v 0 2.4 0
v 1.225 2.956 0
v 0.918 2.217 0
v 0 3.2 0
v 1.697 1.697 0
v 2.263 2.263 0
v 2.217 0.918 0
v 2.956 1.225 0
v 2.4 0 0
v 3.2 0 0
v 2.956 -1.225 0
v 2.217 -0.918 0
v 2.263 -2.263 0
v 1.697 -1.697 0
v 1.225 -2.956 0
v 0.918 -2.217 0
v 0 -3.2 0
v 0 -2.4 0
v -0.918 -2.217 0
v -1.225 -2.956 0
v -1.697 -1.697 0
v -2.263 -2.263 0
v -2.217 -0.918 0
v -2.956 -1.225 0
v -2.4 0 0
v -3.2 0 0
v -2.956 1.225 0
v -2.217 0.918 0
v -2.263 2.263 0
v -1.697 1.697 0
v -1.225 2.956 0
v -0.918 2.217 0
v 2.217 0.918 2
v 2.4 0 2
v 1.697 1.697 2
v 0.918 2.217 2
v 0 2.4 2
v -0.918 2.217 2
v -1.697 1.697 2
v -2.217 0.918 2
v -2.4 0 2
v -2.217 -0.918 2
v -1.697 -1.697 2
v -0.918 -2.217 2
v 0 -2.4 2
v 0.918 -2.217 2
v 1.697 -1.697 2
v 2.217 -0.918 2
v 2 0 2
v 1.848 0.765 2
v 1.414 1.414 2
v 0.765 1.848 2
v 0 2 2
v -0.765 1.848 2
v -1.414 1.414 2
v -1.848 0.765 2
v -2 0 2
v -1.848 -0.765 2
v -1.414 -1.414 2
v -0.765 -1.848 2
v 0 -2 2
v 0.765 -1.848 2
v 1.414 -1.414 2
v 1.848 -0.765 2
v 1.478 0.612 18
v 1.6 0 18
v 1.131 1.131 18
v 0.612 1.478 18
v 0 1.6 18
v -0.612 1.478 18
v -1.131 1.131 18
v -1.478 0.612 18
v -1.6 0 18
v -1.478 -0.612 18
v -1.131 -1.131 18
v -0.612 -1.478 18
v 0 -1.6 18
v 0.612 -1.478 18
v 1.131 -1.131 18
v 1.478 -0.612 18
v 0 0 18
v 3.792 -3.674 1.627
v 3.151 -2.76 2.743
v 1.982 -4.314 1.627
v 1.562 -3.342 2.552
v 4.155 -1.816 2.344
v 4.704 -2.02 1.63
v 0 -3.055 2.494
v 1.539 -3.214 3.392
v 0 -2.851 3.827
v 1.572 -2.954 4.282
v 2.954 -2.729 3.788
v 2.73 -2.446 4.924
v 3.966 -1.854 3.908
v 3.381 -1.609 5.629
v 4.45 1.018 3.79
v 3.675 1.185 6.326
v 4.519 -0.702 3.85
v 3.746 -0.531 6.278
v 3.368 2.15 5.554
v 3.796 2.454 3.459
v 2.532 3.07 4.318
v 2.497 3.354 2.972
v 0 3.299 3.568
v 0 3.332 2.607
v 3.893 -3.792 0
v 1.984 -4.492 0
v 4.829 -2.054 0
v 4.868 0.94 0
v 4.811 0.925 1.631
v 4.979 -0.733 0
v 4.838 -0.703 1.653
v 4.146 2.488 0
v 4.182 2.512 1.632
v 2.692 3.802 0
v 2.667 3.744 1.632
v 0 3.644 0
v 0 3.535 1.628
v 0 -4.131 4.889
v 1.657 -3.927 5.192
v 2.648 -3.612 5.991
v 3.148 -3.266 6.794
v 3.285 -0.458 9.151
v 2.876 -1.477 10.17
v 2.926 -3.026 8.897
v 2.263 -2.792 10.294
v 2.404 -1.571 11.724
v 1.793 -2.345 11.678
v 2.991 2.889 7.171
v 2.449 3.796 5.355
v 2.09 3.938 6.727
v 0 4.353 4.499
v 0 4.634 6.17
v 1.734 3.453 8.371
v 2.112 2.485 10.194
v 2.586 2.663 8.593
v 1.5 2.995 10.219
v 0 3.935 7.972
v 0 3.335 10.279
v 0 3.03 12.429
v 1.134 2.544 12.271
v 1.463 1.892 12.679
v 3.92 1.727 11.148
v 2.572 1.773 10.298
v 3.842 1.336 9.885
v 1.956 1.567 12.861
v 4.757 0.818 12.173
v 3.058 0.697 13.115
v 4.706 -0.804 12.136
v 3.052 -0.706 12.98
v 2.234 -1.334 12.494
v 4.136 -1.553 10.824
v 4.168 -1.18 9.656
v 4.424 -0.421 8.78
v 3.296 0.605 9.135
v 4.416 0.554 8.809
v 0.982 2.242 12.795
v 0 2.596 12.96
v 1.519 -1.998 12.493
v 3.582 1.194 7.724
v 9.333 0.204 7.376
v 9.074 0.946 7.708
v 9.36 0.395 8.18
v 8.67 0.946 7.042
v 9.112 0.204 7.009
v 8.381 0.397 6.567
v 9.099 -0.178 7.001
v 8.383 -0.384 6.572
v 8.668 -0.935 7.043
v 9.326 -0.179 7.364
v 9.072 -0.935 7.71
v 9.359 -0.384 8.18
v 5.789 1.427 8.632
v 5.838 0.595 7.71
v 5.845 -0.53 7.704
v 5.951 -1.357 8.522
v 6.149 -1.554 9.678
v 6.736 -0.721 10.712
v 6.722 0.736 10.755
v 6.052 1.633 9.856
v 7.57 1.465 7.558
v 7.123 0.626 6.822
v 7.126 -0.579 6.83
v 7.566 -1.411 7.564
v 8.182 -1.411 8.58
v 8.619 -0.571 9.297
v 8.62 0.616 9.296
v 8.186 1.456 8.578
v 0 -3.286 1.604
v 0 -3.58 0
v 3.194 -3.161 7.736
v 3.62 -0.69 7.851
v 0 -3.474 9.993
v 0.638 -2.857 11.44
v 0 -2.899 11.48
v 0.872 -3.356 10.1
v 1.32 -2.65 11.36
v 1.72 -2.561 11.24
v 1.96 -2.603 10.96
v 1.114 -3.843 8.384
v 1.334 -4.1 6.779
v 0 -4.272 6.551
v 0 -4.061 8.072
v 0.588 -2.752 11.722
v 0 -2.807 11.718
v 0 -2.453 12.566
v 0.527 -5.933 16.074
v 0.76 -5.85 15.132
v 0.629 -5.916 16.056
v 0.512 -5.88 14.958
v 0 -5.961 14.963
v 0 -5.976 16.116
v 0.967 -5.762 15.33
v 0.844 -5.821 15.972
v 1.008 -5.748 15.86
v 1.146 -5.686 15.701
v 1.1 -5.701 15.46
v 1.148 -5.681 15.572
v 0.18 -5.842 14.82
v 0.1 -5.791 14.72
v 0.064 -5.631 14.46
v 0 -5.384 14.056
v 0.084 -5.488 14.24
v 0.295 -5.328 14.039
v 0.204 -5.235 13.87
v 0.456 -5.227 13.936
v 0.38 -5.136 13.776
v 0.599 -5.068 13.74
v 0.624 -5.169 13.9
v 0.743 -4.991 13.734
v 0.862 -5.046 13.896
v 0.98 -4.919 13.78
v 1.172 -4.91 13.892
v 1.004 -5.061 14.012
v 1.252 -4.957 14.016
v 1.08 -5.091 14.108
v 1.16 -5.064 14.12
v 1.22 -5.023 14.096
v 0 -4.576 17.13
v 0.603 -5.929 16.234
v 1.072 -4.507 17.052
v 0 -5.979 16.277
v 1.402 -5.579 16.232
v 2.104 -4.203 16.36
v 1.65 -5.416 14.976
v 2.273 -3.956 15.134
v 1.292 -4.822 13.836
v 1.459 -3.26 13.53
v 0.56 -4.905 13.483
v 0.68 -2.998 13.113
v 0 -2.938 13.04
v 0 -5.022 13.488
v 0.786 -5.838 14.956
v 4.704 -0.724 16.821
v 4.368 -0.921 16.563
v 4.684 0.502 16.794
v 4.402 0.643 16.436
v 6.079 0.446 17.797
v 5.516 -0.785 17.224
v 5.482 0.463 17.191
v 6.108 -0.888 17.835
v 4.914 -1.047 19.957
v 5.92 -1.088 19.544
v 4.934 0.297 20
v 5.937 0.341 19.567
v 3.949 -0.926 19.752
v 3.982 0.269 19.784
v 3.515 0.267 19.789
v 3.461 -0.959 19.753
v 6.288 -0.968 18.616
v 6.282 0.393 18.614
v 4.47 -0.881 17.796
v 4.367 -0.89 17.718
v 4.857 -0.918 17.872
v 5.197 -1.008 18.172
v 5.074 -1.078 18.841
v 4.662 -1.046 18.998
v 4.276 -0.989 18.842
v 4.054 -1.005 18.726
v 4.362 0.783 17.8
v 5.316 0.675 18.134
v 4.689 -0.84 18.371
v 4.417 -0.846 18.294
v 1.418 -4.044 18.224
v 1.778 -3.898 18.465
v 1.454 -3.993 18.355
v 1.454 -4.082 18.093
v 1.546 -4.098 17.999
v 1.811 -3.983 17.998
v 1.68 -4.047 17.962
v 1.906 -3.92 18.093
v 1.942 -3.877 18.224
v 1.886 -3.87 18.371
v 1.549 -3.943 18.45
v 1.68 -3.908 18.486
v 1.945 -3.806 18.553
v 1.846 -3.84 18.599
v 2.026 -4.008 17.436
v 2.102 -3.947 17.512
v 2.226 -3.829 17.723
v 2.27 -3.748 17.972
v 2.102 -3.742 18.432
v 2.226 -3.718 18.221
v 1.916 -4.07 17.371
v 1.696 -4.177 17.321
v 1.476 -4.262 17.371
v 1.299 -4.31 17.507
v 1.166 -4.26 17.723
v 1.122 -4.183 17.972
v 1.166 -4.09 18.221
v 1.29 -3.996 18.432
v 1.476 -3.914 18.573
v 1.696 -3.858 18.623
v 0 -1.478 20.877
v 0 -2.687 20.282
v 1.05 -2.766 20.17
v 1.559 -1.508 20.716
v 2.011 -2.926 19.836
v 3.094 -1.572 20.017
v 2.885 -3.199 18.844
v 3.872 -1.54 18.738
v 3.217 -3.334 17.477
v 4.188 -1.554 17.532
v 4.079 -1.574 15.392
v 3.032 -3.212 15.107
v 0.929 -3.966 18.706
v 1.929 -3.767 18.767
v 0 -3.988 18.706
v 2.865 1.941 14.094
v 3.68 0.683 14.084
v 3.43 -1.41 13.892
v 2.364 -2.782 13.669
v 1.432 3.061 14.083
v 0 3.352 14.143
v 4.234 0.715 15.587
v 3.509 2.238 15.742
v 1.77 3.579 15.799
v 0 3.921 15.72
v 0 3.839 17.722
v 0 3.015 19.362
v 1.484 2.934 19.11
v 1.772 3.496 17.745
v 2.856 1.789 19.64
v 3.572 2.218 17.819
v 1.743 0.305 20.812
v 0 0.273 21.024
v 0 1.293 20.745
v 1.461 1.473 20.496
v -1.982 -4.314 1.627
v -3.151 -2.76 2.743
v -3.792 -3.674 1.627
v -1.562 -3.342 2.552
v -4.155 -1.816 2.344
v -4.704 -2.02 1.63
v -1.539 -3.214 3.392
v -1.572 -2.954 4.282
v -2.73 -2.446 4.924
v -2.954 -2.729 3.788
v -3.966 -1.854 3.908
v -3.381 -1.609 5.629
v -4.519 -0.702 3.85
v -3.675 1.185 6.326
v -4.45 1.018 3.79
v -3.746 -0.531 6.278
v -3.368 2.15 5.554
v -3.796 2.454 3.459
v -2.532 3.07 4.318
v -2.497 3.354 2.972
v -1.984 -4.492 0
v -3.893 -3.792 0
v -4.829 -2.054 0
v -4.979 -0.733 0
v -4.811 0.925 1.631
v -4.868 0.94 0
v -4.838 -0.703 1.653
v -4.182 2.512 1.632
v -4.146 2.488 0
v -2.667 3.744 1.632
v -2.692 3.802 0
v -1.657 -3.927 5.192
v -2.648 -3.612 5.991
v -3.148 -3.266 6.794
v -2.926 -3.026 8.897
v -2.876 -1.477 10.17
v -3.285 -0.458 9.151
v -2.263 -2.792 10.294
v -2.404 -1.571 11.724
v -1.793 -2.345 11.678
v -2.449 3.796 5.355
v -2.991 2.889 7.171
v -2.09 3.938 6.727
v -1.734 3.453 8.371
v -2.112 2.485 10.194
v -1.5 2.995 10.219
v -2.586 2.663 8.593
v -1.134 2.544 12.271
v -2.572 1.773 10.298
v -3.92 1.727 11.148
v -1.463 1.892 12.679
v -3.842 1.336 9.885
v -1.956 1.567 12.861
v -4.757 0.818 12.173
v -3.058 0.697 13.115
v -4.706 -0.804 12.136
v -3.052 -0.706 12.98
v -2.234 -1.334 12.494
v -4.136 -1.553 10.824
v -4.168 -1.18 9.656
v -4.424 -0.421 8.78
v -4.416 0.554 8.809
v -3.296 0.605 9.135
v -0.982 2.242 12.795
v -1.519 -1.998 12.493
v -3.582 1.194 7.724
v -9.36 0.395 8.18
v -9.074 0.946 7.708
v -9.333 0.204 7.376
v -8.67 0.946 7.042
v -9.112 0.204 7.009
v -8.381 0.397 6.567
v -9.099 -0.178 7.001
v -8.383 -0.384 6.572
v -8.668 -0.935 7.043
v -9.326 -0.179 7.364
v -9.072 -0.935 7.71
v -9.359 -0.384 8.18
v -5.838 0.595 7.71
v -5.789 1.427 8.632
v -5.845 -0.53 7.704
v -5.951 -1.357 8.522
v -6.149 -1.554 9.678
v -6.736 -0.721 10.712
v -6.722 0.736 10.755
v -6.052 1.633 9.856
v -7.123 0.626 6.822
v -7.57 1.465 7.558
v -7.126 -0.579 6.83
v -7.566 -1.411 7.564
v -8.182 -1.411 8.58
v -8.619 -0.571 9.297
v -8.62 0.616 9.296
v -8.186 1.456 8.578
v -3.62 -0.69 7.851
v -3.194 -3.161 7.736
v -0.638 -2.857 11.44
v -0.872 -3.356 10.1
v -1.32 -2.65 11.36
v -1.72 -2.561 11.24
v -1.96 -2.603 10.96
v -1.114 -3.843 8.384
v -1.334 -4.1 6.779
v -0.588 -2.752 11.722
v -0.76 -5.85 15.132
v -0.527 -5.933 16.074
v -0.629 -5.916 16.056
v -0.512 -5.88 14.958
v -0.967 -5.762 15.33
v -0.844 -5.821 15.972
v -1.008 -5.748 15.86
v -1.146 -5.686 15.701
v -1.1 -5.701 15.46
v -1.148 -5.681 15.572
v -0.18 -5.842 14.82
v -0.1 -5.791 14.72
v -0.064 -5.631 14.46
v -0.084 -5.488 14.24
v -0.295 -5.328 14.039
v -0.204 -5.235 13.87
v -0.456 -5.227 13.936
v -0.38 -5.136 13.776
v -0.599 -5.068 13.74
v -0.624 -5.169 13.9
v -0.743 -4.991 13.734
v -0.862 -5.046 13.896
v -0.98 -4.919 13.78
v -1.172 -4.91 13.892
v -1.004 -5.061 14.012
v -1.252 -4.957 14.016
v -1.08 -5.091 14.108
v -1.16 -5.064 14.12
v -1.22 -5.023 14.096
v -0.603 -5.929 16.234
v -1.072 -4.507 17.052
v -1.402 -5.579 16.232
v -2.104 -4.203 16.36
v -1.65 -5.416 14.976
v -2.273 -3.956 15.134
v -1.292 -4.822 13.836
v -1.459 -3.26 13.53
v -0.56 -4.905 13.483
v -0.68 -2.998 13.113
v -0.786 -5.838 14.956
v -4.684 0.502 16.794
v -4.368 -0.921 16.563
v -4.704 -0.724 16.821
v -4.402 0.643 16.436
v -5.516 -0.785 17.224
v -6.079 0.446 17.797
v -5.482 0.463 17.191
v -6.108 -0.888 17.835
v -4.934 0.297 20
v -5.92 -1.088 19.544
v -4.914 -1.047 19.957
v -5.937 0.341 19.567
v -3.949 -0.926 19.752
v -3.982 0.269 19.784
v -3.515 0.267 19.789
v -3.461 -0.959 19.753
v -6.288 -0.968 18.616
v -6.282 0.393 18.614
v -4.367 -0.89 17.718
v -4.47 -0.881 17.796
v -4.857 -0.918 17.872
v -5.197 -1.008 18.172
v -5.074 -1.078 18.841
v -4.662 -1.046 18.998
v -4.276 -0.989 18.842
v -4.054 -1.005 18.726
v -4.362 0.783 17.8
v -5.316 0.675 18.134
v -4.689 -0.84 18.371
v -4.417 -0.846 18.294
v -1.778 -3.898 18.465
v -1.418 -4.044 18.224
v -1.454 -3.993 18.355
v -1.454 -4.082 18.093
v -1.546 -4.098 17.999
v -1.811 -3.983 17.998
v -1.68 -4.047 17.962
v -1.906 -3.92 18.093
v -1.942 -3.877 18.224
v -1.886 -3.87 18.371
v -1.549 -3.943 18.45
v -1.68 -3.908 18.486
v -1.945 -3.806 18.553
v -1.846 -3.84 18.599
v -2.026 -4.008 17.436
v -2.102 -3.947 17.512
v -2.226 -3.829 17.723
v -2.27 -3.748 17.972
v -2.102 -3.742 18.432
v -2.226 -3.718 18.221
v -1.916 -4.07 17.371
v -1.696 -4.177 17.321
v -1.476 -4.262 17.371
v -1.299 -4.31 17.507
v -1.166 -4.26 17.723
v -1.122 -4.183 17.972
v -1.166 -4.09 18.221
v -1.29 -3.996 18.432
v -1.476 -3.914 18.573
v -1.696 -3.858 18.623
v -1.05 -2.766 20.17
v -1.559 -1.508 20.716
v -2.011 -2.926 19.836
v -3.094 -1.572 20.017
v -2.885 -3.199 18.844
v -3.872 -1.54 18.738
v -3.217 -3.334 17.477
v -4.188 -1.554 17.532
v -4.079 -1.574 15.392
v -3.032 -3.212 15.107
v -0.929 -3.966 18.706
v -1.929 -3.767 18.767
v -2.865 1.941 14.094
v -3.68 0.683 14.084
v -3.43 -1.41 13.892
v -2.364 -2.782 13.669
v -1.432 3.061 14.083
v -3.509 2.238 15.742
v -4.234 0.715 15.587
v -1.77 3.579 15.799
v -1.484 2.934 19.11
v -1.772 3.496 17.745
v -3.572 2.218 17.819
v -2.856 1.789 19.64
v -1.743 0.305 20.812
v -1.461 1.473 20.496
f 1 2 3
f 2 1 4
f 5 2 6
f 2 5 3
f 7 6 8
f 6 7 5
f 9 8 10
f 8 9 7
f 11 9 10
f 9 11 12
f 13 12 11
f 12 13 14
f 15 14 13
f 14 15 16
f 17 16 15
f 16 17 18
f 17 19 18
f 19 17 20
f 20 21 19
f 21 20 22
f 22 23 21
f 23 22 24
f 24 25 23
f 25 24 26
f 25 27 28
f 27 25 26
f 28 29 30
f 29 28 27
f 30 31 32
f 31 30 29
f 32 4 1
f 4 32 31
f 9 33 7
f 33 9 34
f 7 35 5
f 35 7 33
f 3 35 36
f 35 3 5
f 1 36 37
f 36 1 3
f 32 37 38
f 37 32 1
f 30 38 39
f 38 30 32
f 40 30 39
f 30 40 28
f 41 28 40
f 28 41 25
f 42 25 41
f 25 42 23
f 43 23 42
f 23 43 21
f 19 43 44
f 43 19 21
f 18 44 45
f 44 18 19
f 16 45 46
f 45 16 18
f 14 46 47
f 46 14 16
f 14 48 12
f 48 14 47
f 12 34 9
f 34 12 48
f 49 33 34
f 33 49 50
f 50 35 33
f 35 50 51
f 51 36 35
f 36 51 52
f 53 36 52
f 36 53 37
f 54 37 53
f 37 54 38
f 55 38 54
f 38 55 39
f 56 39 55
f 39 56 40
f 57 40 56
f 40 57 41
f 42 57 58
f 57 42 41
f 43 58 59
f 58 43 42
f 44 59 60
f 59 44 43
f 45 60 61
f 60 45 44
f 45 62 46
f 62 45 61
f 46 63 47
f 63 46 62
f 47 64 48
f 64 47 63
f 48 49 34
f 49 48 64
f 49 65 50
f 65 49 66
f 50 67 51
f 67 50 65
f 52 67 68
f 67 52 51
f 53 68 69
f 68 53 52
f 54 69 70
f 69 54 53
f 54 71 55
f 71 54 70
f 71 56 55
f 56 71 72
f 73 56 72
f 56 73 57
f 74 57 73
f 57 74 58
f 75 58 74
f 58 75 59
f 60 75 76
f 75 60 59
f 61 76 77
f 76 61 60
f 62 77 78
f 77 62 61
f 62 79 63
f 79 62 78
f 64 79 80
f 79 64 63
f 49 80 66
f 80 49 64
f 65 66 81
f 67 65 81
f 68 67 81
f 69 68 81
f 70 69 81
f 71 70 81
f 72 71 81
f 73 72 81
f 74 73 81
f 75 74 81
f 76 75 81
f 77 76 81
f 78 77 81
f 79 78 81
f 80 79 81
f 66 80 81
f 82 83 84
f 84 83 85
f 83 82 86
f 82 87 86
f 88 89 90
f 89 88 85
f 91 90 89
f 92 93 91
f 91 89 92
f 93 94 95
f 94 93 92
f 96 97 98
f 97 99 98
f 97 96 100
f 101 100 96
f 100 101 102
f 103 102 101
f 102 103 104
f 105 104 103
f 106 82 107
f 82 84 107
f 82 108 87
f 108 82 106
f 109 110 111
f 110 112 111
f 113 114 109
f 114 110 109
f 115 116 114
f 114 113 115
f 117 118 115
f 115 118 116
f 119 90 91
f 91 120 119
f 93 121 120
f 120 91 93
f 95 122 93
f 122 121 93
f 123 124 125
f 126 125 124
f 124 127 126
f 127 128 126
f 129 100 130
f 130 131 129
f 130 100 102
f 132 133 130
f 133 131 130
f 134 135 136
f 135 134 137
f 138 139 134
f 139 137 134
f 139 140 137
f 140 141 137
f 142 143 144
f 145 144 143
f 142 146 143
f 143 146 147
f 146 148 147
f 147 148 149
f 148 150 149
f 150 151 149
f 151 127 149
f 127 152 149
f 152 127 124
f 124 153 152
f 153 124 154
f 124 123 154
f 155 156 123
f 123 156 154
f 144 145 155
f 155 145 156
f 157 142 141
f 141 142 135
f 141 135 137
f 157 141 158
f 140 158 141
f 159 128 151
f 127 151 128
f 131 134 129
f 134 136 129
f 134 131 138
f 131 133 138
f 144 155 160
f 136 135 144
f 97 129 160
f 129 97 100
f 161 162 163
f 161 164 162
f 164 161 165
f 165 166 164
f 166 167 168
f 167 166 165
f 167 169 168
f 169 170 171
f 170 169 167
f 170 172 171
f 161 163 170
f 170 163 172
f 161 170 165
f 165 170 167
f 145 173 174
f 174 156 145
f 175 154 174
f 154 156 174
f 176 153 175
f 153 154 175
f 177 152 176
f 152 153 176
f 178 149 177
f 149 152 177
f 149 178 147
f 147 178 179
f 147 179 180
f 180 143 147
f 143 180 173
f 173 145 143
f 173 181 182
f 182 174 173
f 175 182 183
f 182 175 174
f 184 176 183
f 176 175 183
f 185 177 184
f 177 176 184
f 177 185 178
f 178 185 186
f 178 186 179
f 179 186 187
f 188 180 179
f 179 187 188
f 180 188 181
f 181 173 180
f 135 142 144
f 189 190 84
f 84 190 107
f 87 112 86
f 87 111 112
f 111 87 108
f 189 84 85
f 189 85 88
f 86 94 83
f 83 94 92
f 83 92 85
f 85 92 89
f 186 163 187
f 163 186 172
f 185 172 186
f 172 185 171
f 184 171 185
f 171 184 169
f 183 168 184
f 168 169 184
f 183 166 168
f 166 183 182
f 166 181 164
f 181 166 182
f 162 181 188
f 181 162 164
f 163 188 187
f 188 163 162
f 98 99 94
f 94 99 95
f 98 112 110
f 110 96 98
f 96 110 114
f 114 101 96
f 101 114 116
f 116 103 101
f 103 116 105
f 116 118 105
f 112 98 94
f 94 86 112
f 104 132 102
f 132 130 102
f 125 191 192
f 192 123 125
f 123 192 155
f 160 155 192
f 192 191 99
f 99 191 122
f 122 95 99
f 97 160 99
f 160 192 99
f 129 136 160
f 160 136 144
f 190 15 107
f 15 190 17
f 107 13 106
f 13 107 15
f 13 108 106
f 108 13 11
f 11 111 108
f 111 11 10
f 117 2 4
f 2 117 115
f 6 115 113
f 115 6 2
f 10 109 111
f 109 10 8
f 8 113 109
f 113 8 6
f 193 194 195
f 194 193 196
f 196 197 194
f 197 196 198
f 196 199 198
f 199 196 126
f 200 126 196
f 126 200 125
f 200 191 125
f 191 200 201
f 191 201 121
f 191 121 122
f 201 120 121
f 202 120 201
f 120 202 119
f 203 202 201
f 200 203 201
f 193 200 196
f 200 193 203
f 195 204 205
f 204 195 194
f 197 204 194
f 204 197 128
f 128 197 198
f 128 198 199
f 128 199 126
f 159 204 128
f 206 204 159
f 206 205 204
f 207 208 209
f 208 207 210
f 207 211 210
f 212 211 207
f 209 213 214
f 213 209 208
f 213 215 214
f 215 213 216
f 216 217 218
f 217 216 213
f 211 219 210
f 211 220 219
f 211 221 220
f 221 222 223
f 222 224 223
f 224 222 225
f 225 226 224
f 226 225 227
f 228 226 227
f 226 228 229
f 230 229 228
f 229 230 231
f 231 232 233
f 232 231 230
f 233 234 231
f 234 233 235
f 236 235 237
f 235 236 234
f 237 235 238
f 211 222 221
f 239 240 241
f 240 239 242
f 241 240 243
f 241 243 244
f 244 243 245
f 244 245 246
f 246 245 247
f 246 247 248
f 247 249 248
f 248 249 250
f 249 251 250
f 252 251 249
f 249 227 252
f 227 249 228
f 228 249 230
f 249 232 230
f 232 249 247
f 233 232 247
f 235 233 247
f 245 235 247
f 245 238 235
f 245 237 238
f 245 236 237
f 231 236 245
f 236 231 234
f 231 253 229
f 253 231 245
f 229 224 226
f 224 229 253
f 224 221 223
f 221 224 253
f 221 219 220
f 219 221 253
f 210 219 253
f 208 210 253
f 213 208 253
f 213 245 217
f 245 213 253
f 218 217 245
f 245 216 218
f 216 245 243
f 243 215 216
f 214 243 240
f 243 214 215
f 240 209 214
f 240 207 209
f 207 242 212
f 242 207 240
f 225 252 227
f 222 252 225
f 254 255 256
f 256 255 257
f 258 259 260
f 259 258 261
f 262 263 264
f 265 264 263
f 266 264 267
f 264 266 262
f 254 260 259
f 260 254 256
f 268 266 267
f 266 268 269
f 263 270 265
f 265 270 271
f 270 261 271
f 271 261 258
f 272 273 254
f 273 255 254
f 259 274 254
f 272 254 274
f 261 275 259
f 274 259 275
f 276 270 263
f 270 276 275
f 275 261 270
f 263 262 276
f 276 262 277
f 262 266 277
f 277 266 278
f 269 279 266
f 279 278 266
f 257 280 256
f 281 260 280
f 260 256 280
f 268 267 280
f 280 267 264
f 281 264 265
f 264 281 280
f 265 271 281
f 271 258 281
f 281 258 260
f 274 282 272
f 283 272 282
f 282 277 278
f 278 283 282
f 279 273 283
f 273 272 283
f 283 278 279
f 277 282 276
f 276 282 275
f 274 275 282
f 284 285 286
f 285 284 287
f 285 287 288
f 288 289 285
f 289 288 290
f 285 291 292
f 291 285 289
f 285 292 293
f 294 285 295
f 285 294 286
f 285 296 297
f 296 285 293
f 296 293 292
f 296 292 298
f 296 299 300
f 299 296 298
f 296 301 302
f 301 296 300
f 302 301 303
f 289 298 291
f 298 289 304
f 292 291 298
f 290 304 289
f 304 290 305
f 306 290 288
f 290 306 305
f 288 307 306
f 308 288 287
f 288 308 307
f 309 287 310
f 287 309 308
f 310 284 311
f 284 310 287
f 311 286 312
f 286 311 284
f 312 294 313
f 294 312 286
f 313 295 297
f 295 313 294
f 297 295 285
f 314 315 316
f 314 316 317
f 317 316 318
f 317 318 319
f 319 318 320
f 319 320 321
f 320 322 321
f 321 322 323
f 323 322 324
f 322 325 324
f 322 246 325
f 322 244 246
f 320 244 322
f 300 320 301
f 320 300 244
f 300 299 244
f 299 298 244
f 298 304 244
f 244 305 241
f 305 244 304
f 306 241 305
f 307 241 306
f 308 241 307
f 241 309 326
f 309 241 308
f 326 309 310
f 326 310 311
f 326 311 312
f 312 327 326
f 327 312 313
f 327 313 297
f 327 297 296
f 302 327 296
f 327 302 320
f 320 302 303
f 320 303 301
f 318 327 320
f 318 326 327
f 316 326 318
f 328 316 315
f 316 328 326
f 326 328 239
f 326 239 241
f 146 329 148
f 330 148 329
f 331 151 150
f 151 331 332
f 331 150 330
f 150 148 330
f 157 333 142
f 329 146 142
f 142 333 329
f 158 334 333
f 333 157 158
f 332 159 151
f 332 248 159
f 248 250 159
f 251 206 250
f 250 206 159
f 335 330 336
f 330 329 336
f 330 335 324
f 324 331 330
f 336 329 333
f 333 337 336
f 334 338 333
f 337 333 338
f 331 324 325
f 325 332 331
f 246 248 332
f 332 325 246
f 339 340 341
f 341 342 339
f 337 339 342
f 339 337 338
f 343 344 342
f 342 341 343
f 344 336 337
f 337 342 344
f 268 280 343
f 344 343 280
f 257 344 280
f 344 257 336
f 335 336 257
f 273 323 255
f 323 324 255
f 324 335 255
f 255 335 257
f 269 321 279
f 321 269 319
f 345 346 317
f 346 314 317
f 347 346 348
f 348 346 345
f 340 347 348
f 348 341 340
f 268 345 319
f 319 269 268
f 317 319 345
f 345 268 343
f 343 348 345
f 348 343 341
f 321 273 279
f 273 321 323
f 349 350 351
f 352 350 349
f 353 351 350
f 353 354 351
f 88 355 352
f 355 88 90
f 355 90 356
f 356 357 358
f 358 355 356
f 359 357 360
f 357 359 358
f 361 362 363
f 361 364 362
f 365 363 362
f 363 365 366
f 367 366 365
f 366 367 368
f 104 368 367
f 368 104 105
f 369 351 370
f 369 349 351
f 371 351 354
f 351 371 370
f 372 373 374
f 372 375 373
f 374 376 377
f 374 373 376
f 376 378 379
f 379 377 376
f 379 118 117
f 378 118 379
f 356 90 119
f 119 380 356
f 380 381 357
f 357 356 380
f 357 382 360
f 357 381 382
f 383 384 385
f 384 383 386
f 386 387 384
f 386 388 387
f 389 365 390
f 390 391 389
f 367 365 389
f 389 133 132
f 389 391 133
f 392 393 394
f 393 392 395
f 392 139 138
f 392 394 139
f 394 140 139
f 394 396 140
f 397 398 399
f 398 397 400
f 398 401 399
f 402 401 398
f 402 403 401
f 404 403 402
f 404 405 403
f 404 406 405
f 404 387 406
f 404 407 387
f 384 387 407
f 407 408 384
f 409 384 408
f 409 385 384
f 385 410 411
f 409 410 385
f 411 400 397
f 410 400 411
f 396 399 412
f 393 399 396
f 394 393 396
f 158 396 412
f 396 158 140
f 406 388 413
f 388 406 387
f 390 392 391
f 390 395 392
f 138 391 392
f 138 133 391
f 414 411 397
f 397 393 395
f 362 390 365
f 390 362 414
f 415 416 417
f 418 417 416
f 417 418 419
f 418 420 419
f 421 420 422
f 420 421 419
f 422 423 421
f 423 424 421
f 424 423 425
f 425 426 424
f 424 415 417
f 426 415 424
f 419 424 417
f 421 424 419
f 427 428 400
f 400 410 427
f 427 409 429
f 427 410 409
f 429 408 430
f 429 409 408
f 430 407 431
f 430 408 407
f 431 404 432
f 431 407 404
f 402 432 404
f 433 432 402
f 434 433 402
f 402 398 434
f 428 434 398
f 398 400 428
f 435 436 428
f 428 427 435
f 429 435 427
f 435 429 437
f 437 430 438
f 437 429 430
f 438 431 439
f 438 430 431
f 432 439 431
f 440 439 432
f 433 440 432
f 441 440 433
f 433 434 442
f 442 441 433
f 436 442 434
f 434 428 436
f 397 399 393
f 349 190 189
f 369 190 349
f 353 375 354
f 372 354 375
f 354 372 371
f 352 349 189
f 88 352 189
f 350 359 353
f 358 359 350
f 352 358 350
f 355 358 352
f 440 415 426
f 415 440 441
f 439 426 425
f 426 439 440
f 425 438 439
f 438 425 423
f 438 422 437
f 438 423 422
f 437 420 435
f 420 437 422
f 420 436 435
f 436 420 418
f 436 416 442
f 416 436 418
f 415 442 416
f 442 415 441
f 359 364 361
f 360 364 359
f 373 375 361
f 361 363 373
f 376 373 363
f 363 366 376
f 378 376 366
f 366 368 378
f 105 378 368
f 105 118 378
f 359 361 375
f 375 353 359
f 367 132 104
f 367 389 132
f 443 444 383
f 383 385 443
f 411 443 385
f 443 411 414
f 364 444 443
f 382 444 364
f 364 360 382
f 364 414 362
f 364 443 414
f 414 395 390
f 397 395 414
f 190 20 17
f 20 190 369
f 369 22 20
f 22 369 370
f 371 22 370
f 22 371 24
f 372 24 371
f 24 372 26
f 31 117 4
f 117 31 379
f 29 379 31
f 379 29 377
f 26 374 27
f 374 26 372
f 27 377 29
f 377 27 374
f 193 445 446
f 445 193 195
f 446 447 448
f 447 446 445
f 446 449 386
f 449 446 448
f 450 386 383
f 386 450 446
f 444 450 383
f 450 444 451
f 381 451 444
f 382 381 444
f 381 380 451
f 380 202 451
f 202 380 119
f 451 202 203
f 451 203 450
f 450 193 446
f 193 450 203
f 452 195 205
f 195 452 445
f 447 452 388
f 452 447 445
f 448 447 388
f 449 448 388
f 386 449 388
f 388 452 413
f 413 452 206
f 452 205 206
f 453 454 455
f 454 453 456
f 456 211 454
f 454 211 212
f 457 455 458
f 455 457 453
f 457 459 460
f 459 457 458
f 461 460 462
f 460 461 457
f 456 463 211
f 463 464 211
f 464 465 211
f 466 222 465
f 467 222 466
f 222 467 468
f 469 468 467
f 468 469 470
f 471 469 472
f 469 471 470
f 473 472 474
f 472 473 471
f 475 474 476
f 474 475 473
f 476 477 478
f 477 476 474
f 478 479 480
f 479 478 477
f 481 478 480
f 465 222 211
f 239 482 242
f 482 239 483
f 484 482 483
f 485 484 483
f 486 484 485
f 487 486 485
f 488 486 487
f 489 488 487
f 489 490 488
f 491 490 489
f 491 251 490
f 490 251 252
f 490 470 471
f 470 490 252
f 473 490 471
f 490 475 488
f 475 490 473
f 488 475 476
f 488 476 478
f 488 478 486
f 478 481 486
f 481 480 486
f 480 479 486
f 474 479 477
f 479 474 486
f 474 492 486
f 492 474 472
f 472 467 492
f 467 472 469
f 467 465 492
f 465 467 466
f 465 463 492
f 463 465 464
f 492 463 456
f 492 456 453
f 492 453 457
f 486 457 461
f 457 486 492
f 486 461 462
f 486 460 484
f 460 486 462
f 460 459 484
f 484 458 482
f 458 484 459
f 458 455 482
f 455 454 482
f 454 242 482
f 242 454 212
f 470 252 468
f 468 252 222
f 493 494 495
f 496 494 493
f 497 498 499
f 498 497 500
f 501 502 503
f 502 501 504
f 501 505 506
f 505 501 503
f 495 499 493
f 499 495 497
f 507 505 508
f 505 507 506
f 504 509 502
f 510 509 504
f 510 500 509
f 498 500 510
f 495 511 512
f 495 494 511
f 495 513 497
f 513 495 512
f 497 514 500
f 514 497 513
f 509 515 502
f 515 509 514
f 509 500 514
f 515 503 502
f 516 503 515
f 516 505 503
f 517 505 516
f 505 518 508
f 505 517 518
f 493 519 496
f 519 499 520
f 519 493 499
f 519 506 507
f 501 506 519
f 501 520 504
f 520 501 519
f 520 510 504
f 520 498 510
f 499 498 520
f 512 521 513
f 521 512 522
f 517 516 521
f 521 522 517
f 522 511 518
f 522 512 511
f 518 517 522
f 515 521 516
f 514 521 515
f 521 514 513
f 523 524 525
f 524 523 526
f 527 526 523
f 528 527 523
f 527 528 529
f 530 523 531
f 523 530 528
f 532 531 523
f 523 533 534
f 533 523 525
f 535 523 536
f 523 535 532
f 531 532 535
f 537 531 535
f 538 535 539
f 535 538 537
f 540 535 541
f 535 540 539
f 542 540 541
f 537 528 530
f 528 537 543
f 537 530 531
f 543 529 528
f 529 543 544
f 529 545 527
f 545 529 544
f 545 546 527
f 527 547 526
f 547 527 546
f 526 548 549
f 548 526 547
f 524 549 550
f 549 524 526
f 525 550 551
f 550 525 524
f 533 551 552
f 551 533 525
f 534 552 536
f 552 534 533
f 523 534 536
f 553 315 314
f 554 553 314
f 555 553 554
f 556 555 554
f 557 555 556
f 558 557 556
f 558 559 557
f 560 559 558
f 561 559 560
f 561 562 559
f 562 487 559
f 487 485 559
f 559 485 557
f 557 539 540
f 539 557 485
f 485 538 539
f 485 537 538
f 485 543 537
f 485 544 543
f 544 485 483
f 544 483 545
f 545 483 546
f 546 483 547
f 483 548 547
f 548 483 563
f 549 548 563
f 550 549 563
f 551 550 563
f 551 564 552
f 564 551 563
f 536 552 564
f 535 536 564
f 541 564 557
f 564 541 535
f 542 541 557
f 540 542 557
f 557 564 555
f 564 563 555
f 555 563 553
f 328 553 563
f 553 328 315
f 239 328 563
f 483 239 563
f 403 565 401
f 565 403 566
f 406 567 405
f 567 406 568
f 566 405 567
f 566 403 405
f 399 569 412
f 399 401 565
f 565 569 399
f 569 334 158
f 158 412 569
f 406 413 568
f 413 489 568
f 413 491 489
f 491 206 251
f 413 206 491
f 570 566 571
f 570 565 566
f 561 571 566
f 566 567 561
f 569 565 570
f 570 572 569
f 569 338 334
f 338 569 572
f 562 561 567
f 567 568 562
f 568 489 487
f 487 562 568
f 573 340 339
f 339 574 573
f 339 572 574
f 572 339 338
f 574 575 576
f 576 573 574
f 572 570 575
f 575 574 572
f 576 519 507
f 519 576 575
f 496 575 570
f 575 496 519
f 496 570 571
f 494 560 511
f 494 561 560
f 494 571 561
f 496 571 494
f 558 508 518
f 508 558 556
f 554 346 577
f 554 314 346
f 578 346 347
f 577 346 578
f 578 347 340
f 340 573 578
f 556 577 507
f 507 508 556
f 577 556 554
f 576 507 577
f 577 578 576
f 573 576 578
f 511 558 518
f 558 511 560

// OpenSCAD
use <../lib.scad>
use <../p/4-4con4.scad>
use <../p/4-4disc.scad>
use <../p/4-4edge.scad>
use <../p/4-4ring5.scad>
use <s/98382p01s02.scad>
use <s/98382p01s03.scad>
use <s/98382p01s05.scad>
use <s/98382s01.scad>
use <s/98382s04.scad>
use <s/98382s06.scad>
use <../p/stud4od.scad>
function ldraw_lib__98382p01() = [
// 0 Minifig Teddy Bear with Arms Down with Tan Belly and Muzzle and Black Nose and Eyes Pattern
// 0 Name: 98382p01.dat
// 0 Author: Philippe Hurbain [Philo]
// 0 !LDRAW_ORG Part UPDATE 2017-01
// 0 !LICENSE Licensed under CC BY 4.0 : see CAreadme.txt
// 
// 0 BFC CERTIFY CCW
  [0,"BFC","CERTIFY"],
  [0,"BFC","CCW"],
// 
// 0 !CATEGORY Minifig Accessory
// 0 !KEYWORDS animal, BrickLink 98382pb001, Rebrickable 98382pr0001, set 10235
// 0 !KEYWORDS Toy
// 
// 0 !HISTORY 2013-08-14 {LEGO Digital Designer} Original part shape
// 0 !HISTORY 2017-02-20 [Philo] File preparation for LDraw Parts Tracker
// 0 !HISTORY 2017-12-30 [PTadmin] Official Update 2017-01
// 
// 
// 1 16 0 -5 0 -1 0 0 0 -1.25 0 0 0 1 stud4od.dat
  [1,16,0,-5,0,-1,0,0,0,-1.25,0,0,0,1, ldraw_lib__stud4od()],
// 1 16 0 -5 0 1 0 0 0 -1 0 0 0 1 4-4ring5.dat
  [1,16,0,-5,0,1,0,0,0,-1,0,0,0,1, ldraw_lib__4_4ring5()],
// 1 16 0 -5 0 5 0 0 0 -1 0 0 0 5 4-4edge.dat
  [1,16,0,-5,0,5,0,0,0,-1,0,0,0,5, ldraw_lib__4_4edge()],
// 0 BFC INVERTNEXT
  [0,"BFC","INVERTNEXT"],
// 1 16 0 -5 0 1 0 0 0 -40 0 0 0 1 4-4con4.dat
  [1,16,0,-5,0,1,0,0,0,-40,0,0,0,1, ldraw_lib__4_4con4()],
// 1 16 0 -45 0 4 0 0 0 -1 0 0 0 4 4-4edge.dat
  [1,16,0,-45,0,4,0,0,0,-1,0,0,0,4, ldraw_lib__4_4edge()],
// 1 16 0 -45 0 4 0 0 0 -1 0 0 0 4 4-4disc.dat
  [1,16,0,-45,0,4,0,0,0,-1,0,0,0,4, ldraw_lib__4_4disc()],
// 
// 1 16 0 0 0 1 0 0 0 1 0 0 0 1 s\98382s01.dat
  [1,16,0,0,0,1,0,0,0,1,0,0,0,1, ldraw_lib__s__98382s01()],
// 1 16 0 0 0 1 0 0 0 1 0 0 0 1 s\98382p01s02.dat
  [1,16,0,0,0,1,0,0,0,1,0,0,0,1, ldraw_lib__s__98382p01s02()],
// 1 19 0 0 0 1 0 0 0 1 0 0 0 1 s\98382p01s03.dat
  [1,19,0,0,0,1,0,0,0,1,0,0,0,1, ldraw_lib__s__98382p01s03()],
// 1 16 0 0 0 1 0 0 0 1 0 0 0 1 s\98382s04.dat
  [1,16,0,0,0,1,0,0,0,1,0,0,0,1, ldraw_lib__s__98382s04()],
// 1 16 0 0 0 1 0 0 0 1 0 0 0 1 s\98382p01s05.dat
  [1,16,0,0,0,1,0,0,0,1,0,0,0,1, ldraw_lib__s__98382p01s05()],
// 1 16 0 0 0 1 0 0 0 1 0 0 0 1 s\98382s06.dat
  [1,16,0,0,0,1,0,0,0,1,0,0,0,1, ldraw_lib__s__98382s06()],
// 1 16 0 0 0 -1 0 0 0 1 0 0 0 1 s\98382s01.dat
  [1,16,0,0,0,-1,0,0,0,1,0,0,0,1, ldraw_lib__s__98382s01()],
// 1 16 0 0 0 -1 0 0 0 1 0 0 0 1 s\98382p01s02.dat
  [1,16,0,0,0,-1,0,0,0,1,0,0,0,1, ldraw_lib__s__98382p01s02()],
// 1 19 0 0 0 -1 0 0 0 1 0 0 0 1 s\98382p01s03.dat
  [1,19,0,0,0,-1,0,0,0,1,0,0,0,1, ldraw_lib__s__98382p01s03()],
// 1 16 0 0 0 -1 0 0 0 1 0 0 0 1 s\98382s04.dat
  [1,16,0,0,0,-1,0,0,0,1,0,0,0,1, ldraw_lib__s__98382s04()],
// 1 16 0 0 0 -1 0 0 0 1 0 0 0 1 s\98382p01s05.dat
  [1,16,0,0,0,-1,0,0,0,1,0,0,0,1, ldraw_lib__s__98382p01s05()],
// 1 16 0 0 0 -1 0 0 0 1 0 0 0 1 s\98382s06.dat
  [1,16,0,0,0,-1,0,0,0,1,0,0,0,1, ldraw_lib__s__98382s06()],
];
module ldraw_lib__98382p01(step=0, col=false, unit=2/5, alt=false, line=0.2, solid=!$preview)
    makepoly(ldraw_lib__98382p01(), step=step, col=col, unit=unit, alt=alt, line=line, solid=solid);
ldraw_lib__98382p01(line=0.2);
